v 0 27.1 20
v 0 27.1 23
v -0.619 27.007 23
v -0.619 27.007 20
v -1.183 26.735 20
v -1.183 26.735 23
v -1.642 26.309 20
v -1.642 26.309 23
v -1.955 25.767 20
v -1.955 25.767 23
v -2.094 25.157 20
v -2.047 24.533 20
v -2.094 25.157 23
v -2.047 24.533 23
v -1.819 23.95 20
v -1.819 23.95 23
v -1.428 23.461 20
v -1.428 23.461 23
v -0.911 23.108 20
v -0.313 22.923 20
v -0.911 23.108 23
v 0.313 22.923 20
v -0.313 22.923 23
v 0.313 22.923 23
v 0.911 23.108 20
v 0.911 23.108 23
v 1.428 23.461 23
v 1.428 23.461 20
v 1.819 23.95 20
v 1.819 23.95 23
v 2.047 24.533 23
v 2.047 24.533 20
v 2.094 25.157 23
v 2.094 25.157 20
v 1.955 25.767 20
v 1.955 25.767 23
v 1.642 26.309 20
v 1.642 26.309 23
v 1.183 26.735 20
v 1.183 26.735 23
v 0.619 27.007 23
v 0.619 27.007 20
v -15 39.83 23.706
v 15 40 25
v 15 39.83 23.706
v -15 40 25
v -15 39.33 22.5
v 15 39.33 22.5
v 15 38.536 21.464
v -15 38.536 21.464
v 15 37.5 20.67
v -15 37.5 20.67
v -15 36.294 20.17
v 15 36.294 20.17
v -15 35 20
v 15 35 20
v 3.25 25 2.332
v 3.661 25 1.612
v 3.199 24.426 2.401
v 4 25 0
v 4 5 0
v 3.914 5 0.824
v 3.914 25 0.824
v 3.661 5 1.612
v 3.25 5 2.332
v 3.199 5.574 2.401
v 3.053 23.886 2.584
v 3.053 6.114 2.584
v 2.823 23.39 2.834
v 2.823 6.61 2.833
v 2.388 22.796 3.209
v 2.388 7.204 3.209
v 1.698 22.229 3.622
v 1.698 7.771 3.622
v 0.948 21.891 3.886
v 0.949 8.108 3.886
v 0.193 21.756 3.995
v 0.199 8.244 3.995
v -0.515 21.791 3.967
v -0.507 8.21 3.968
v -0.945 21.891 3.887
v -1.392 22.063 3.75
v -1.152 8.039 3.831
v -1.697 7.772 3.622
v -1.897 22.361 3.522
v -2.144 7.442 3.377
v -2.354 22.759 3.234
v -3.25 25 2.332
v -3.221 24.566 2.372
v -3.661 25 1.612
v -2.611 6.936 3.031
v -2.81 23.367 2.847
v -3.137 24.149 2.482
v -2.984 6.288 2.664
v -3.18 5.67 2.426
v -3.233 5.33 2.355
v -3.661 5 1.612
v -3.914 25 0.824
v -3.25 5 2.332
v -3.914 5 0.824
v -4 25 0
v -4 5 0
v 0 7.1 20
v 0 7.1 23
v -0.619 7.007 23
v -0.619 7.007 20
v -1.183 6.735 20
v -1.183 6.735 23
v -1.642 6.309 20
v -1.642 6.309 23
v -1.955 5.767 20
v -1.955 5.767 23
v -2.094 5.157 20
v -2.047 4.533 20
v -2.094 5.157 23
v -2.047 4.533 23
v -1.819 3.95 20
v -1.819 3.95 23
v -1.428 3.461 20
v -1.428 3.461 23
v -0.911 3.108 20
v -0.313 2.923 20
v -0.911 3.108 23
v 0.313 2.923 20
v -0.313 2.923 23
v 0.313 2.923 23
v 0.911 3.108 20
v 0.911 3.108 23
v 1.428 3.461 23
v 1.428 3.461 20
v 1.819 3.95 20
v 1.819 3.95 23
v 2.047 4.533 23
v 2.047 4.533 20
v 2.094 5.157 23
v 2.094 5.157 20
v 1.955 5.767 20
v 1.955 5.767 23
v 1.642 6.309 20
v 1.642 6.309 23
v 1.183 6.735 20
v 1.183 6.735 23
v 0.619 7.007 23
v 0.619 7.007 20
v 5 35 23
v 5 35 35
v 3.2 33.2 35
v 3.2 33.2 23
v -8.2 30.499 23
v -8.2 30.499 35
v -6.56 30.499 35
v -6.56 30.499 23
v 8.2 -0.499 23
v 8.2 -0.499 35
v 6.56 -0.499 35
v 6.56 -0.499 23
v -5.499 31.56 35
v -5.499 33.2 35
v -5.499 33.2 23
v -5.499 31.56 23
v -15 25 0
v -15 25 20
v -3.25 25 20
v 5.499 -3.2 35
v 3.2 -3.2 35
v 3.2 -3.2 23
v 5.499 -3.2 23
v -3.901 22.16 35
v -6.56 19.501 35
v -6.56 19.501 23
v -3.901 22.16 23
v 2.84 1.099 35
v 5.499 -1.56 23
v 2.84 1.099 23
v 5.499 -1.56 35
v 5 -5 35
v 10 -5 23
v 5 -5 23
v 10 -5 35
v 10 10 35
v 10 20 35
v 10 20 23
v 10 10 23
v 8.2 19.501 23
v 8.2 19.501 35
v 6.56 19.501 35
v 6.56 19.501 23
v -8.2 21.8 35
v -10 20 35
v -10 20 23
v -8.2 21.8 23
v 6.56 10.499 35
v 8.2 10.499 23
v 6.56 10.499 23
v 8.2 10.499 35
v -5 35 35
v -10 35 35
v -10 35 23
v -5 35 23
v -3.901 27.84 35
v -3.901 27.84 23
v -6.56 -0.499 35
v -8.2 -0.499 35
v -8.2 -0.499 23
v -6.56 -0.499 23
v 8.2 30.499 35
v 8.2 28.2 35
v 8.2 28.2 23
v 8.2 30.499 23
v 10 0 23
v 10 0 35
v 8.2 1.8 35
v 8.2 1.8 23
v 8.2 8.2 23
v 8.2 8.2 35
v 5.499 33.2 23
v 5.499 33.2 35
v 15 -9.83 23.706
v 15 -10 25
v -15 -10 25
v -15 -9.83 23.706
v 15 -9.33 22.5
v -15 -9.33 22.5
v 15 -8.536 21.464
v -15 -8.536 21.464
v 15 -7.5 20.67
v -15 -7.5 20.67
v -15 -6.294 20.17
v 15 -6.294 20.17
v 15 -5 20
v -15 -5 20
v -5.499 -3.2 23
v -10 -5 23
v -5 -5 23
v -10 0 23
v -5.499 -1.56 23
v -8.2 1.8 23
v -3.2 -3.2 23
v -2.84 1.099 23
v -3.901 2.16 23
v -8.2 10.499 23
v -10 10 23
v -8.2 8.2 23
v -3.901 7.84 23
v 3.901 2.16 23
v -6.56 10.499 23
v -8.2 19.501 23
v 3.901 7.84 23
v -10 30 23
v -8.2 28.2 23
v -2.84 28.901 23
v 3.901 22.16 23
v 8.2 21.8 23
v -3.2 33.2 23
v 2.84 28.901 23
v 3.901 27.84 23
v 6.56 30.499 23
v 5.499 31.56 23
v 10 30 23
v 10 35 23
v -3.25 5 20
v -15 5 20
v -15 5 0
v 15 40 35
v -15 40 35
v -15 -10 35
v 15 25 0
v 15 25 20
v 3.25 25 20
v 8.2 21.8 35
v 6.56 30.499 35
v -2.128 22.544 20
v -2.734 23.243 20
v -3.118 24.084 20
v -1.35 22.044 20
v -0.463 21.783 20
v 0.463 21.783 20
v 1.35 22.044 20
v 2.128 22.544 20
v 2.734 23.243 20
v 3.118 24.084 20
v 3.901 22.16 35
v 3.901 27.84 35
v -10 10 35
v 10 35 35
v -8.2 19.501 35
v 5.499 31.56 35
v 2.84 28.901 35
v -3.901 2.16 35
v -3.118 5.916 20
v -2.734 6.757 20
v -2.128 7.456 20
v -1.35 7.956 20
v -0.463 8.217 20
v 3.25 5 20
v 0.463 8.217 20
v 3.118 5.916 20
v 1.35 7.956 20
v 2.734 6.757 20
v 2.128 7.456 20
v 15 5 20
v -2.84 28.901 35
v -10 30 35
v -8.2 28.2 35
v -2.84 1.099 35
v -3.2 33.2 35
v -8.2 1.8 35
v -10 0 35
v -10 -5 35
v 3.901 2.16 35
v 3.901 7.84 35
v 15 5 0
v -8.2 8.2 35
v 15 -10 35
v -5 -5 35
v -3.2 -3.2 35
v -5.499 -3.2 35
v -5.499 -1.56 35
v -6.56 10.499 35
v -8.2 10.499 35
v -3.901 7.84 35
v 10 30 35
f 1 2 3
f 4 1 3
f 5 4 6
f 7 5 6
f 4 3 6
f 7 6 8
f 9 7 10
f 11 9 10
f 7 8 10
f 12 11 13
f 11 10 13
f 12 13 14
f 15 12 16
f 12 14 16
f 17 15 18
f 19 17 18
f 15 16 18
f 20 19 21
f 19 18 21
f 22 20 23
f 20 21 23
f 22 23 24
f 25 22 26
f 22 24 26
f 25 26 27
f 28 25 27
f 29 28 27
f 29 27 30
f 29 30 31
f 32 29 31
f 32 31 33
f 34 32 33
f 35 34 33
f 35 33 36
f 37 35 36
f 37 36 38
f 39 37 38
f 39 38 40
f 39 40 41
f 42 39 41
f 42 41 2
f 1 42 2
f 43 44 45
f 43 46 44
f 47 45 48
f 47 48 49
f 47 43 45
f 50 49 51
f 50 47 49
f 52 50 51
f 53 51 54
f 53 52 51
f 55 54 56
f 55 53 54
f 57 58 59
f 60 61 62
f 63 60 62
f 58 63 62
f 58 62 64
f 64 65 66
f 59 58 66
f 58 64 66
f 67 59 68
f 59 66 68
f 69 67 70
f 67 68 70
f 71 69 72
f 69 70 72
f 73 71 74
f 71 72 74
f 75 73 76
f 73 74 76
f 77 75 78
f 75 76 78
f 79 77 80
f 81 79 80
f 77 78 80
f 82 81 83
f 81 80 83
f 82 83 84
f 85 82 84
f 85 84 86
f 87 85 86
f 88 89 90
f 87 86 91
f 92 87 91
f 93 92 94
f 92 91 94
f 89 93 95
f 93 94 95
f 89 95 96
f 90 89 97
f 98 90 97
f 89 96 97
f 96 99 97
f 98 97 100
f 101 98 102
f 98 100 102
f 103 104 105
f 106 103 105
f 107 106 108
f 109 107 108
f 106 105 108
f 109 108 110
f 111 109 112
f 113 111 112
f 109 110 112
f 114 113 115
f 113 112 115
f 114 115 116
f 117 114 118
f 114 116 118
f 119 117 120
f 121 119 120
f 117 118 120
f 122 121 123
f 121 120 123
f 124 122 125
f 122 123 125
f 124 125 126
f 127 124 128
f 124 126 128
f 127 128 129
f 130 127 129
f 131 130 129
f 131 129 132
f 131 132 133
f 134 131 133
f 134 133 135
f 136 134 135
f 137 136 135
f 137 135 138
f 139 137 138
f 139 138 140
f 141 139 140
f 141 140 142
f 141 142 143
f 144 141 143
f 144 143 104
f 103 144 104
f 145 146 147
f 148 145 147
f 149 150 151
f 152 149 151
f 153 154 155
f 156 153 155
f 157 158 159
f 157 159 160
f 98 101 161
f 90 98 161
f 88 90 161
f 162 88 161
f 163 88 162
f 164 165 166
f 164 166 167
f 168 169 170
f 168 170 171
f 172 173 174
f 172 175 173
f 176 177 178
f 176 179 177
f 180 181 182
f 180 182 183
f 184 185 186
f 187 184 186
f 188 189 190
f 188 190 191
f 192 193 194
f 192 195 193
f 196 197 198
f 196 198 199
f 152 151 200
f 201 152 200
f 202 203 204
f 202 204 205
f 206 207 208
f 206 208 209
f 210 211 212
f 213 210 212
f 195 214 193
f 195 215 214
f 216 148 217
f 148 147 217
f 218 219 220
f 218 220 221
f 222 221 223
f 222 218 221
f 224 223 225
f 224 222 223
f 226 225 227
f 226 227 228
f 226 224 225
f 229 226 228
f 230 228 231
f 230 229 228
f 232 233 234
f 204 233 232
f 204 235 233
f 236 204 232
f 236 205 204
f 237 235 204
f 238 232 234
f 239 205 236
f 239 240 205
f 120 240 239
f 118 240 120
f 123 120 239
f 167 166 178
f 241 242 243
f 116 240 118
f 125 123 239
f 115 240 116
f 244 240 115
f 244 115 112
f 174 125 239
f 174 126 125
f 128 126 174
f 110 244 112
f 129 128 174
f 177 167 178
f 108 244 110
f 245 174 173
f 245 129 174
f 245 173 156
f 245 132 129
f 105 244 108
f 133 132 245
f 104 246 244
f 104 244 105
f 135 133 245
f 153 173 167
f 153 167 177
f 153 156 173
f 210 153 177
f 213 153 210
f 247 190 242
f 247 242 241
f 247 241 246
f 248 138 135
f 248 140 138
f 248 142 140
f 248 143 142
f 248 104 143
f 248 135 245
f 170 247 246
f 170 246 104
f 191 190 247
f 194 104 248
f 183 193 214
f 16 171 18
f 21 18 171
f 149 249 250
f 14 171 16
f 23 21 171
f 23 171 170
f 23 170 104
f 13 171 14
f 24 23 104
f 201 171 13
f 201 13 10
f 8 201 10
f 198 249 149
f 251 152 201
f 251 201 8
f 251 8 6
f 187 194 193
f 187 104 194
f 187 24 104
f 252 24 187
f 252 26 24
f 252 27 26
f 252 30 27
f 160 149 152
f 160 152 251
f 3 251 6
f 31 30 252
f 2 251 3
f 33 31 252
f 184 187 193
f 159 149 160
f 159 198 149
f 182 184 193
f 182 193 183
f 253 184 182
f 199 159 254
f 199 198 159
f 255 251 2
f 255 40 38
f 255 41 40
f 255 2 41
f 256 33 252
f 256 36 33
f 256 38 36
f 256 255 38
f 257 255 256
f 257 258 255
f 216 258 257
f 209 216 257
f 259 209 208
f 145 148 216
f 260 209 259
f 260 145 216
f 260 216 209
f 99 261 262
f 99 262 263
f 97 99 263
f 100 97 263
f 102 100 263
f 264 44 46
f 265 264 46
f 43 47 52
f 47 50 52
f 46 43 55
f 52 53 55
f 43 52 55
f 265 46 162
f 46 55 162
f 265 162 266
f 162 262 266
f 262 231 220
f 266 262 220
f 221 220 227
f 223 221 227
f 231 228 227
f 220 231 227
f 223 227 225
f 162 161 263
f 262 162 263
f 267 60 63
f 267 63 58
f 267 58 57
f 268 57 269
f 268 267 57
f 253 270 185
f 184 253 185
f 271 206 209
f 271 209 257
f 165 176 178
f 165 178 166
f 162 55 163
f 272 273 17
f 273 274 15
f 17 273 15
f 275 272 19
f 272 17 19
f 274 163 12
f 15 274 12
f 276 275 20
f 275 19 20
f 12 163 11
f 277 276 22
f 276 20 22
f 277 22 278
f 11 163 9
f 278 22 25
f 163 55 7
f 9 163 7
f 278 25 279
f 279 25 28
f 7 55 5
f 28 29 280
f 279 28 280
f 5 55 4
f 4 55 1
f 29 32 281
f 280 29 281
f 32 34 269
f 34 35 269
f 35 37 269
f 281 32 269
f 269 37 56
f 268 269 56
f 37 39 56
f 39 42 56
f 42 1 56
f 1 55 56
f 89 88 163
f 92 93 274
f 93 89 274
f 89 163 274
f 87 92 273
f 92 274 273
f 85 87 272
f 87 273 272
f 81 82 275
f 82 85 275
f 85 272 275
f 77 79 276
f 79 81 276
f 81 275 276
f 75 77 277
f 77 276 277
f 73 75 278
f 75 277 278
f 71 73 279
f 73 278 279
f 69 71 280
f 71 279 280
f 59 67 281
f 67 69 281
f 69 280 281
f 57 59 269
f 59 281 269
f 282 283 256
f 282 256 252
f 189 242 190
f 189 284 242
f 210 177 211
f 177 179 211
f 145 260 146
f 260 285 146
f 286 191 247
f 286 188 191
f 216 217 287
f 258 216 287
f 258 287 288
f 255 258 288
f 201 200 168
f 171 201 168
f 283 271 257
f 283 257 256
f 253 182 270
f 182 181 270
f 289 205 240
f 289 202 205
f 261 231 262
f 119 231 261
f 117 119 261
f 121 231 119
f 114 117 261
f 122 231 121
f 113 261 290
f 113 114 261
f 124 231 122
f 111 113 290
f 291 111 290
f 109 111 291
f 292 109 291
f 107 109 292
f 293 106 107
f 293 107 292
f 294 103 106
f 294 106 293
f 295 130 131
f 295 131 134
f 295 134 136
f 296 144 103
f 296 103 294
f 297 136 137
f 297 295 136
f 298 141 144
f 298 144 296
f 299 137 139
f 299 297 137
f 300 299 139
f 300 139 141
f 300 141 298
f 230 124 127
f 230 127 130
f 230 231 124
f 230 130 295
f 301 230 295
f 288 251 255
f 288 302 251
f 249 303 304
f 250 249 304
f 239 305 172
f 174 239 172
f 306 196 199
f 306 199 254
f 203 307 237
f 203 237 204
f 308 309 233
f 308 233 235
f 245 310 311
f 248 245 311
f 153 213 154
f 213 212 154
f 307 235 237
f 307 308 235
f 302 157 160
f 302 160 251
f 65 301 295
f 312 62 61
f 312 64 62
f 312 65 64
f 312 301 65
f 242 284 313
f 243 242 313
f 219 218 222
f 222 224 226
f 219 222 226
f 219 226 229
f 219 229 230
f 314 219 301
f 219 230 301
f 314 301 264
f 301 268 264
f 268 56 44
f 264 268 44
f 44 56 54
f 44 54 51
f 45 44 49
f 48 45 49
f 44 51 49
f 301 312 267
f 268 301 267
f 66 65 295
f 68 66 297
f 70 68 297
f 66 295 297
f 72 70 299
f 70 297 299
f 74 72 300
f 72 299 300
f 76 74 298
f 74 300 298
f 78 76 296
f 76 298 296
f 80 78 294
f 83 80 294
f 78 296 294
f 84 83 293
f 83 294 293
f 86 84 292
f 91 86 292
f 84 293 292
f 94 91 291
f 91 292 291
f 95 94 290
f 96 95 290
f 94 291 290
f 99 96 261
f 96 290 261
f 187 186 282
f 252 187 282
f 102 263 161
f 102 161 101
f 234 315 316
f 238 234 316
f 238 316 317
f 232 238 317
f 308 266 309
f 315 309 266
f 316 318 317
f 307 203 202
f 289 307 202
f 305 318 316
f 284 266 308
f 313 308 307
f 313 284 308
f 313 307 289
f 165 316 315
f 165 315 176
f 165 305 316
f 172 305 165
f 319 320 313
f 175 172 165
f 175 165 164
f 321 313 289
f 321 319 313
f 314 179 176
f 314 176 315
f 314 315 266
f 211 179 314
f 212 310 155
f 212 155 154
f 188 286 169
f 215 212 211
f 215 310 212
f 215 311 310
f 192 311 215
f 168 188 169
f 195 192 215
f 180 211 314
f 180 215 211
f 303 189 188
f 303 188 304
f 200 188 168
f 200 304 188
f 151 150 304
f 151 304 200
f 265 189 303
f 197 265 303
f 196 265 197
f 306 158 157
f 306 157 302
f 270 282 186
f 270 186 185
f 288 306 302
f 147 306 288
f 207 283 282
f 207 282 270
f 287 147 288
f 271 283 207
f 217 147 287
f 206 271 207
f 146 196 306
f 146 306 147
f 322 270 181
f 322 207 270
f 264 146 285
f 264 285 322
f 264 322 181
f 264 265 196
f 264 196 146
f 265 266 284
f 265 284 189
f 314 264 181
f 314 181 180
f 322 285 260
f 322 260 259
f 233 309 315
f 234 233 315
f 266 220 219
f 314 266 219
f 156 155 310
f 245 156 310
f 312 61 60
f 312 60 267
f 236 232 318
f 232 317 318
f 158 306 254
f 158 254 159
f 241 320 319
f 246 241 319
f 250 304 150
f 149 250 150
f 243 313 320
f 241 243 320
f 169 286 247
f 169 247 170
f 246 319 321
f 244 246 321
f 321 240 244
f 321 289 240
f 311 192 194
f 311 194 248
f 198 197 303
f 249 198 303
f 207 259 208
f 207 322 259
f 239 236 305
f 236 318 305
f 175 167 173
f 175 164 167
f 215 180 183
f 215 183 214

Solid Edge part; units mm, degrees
sketch "Sketch1" plane through (0, 0, 0) normal (0, -1, 0) x (1, 0, 0)
  line L0 (-15, 20) -> (-15, 0)
  line L1 (-15, 0) -> (-4, 0)
  line L2 (4, 0) -> (15, 0)
  line L3 (15, 0) -> (15, 20)
  line L4 (-15, 20) -> (15, 20)
  arc A0 (-4, 0) -> (4, 0) centre (0, 0) cw
extrude "Protrusion1" add sketch "Sketch1" against normal blind 30
sketch "Sketch2" plane through (0, 15, 20) normal (0, 0, 1) x (1, 0, 0)
  line L0 (-15, -25) -> (15, -25)
  line L1 (15, -25) -> (15, 25)
  line L2 (15, 25) -> (-15, 25)
  line L3 (-15, 25) -> (-15, -25)
extrude "ExtrudedProtrusion_2" add sketch "Sketch2" along normal blind 15
fillet "Round_1" radius 5 1 edges at (0, -10, 20)
sketch "Sketch3" plane through (15, 15, 17.5) normal (1, 0, 0) x (0, 1, 0)
  line L0 (10, -17.5) -> (10, 2.5)
  line L1 (10, 2.5) -> (15, 2.5)
  line L2 (15, 2.5) -> (15, -17.5)
  line L3 (15, -17.5) -> (10, -17.5)
  line L4 (-10, 2.5) -> (-10, -17.5)
  line L5 (-10, -17.5) -> (-15, -17.5)
  line L6 (-15, -17.5) -> (-15, 2.5)
  line L7 (-15, 2.5) -> (-10, 2.5)
extrude "Cutout1" cut sketch "Sketch3" against normal blind 30
fillet "Round_4" radius 5 1 edges at (0, 40, 20)
sketch "Sketch4" plane through (0, 15, 35) normal (0, 0, 1) x (0, 1, 0)
  line L0 (4.5007, -6.56) -> (7.16, -3.9007)
  line L1 (12.84, -3.9007) -> (7.16, -3.9007)
  line L2 (15.4993, -6.56) -> (12.84, -3.9007)
  line L3 (15.4993, -8.2) -> (15.4993, -6.56)
  line L4 (13.2, -8.2) -> (15.4993, -8.2)
  line L5 (15, -10) -> (13.2, -8.2)
  line L6 (20, -10) -> (15, -10)
  line L7 (20, -10) -> (20, -5)
  line L8 (20, -5) -> (18.2, -3.2)
  line L9 (18.2, -3.2) -> (18.2, -5.4993)
  line L10 (18.2, -5.4993) -> (16.56, -5.4993)
  line L11 (16.56, -5.4993) -> (13.9007, -2.84)
  line L12 (13.9007, 2.84) -> (13.9007, -2.84)
  line L13 (16.56, 5.4993) -> (13.9007, 2.84)
  line L14 (18.2, 5.4993) -> (16.56, 5.4993)
  line L15 (18.2, 3.2) -> (18.2, 5.4993)
  line L16 (20, 5) -> (18.2, 3.2)
  line L17 (20, 10) -> (20, 5)
  line L18 (20, 10) -> (15, 10)
  line L19 (15, 10) -> (13.2, 8.2)
  line L20 (13.2, 8.2) -> (15.4993, 8.2)
  line L21 (15.4993, 8.2) -> (15.4993, 6.56)
  line L22 (15.4993, 6.56) -> (12.84, 3.9007)
  line L23 (12.84, 3.9007) -> (7.16, 3.9007)
  line L24 (4.5007, 6.56) -> (7.16, 3.9007)
  line L25 (4.5007, 8.2) -> (4.5007, 6.56)
  line L26 (6.8, 8.2) -> (4.5007, 8.2)
  line L27 (5, 10) -> (6.8, 8.2)
  line L28 (0, 10) -> (5, 10)
  line L29 (0, 10) -> (-5, 10)
  line L30 (-5, 10) -> (-6.8, 8.2)
  line L31 (-6.8, 8.2) -> (-4.5007, 8.2)
  line L32 (-4.5007, 8.2) -> (-4.5007, 6.56)
  line L33 (-4.5007, 6.56) -> (-7.16, 3.9007)
  line L34 (-12.84, 3.9007) -> (-7.16, 3.9007)
  line L35 (-15.4993, 6.56) -> (-12.84, 3.9007)
  line L36 (-15.4993, 8.2) -> (-15.4993, 6.56)
  line L37 (-13.2, 8.2) -> (-15.4993, 8.2)
  line L38 (-15, 10) -> (-13.2, 8.2)
  line L39 (-20, 10) -> (-15, 10)
  line L40 (-20, 10) -> (-20, 5)
  line L41 (-20, 5) -> (-18.2, 3.2)
  line L42 (-18.2, 3.2) -> (-18.2, 5.4993)
  line L43 (-18.2, 5.4993) -> (-16.56, 5.4993)
  line L44 (-16.56, 5.4993) -> (-13.9007, 2.84)
  line L45 (-13.9007, 2.84) -> (-13.9007, -2.84)
  line L46 (-16.56, -5.4993) -> (-13.9007, -2.84)
  line L47 (-18.2, -5.4993) -> (-16.56, -5.4993)
  line L48 (-18.2, -3.2) -> (-18.2, -5.4993)
  line L49 (-20, -5) -> (-18.2, -3.2)
  line L50 (-20, -10) -> (-20, -5)
  line L51 (-20, -10) -> (-15, -10)
  line L52 (-15, -10) -> (-13.2, -8.2)
  line L53 (-13.2, -8.2) -> (-15.4993, -8.2)
  line L54 (-15.4993, -8.2) -> (-15.4993, -6.56)
  line L55 (-15.4993, -6.56) -> (-12.84, -3.9007)
  line L56 (-12.84, -3.9007) -> (-7.16, -3.9007)
  line L57 (-4.5007, -6.56) -> (-7.16, -3.9007)
  line L58 (-4.5007, -8.2) -> (-4.5007, -6.56)
  line L59 (-6.8, -8.2) -> (-4.5007, -8.2)
  line L60 (-5, -10) -> (-6.8, -8.2)
  line L61 (0, -10) -> (-5, -10)
  line L62 (0, -10) -> (5, -10)
  line L63 (5, -10) -> (6.8, -8.2)
  line L64 (6.8, -8.2) -> (4.5007, -8.2)
  line L65 (4.5007, -8.2) -> (4.5007, -6.56)
extrude "ExtrudedCutout_7" cut sketch "Sketch4" against normal blind 12
sketch "Sketch5" plane through (0, 15, 35) normal (0, 0, 1) x (0, 1, 0)
  circle A0 centre (-10, 0) radius 2.1
  circle A1 centre (10, 0) radius 2.1
extrude "ExtrudedCutout_8" cut sketch "Sketch5" against normal blind 50
sketch "Sketch6" plane through (0, 30, 20) normal (0, 0, -1) x (0, 1, 0)
  circle A0 centre (-5, 0) radius 3.25
  circle A1 centre (-25, 0) radius 3.25
extrude "ExtrudedCutout_9" cut sketch "Sketch6" along normal blind 30
extrude "ExtrudedCutout_1" [suppressed]
extrude "ExtrudedCutout_2" [suppressed]
extrude "ExtrudedCutout_4" [suppressed]
extrude "ExtrudedCutout_5" [suppressed]
fillet "Round_2" [suppressed]
